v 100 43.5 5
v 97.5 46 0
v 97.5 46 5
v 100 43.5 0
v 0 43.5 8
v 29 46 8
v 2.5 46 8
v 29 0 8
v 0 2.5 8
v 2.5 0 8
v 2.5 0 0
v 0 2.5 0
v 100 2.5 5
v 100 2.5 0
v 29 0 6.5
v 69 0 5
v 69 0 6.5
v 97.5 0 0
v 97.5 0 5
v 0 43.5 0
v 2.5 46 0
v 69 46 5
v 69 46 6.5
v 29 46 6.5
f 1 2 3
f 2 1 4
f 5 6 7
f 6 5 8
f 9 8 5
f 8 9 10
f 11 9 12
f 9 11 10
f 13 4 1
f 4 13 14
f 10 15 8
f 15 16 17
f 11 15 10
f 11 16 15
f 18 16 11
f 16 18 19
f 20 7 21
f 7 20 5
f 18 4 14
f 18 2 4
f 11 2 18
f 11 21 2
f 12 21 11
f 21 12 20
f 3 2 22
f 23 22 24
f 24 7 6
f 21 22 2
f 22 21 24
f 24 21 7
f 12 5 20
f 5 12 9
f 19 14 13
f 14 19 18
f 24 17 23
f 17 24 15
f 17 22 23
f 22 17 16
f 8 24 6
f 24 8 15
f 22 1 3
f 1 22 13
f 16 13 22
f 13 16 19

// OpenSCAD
$fn = 32;

// ----------------------------------------------------------------------
// Stepped bar: twostep, 100 x 46 x 8/5 mm
// ----------------------------------------------------------------------

// --- parameters (mm) ---
bar_l = 100;              // bar length, X
bar_w = 46;               // bar width, Y
plate_t = 8;              // thickness of the thick zone, Z
thin_t = 5;               // thickness of the thin zone
corner_c = 2.5;           // corner chamfer of the bar
step_cut = 3;             // material removed from the thin zone
stair1_x = 29;            // position of the first stair
stair2_x = 69;            // position of the second stair
mid_t = 6.5;              // thickness of the middle zone
depth_1 = 1.5;            // depth of cut 1 from the top face
depth_2 = 3;              // depth of cut 2 from the top face

profile = [[2.5, 0], [97.5, 0], [100, 2.5], [100, 43.5], [97.5, 46], [2.5, 46], [0, 43.5], [0, 2.5]];  // primary outline, 8 points, counter clockwise
void_1 = [[29, -1], [69, -1], [69, 47], [29, 47]];  // first stair, 4 points
void_2 = [[69, -1], [101, -1], [101, 47], [69, 47]];  // second stair, 4 points

// --- the one profile operation ---
difference() {
  linear_extrude(height = plate_t) polygon(points = profile);
  translate([0, 0, plate_t - depth_1])
    linear_extrude(height = depth_1 + 1) polygon(points = void_1);
  translate([0, 0, plate_t - depth_2])
    linear_extrude(height = depth_2 + 1) polygon(points = void_2);
}
